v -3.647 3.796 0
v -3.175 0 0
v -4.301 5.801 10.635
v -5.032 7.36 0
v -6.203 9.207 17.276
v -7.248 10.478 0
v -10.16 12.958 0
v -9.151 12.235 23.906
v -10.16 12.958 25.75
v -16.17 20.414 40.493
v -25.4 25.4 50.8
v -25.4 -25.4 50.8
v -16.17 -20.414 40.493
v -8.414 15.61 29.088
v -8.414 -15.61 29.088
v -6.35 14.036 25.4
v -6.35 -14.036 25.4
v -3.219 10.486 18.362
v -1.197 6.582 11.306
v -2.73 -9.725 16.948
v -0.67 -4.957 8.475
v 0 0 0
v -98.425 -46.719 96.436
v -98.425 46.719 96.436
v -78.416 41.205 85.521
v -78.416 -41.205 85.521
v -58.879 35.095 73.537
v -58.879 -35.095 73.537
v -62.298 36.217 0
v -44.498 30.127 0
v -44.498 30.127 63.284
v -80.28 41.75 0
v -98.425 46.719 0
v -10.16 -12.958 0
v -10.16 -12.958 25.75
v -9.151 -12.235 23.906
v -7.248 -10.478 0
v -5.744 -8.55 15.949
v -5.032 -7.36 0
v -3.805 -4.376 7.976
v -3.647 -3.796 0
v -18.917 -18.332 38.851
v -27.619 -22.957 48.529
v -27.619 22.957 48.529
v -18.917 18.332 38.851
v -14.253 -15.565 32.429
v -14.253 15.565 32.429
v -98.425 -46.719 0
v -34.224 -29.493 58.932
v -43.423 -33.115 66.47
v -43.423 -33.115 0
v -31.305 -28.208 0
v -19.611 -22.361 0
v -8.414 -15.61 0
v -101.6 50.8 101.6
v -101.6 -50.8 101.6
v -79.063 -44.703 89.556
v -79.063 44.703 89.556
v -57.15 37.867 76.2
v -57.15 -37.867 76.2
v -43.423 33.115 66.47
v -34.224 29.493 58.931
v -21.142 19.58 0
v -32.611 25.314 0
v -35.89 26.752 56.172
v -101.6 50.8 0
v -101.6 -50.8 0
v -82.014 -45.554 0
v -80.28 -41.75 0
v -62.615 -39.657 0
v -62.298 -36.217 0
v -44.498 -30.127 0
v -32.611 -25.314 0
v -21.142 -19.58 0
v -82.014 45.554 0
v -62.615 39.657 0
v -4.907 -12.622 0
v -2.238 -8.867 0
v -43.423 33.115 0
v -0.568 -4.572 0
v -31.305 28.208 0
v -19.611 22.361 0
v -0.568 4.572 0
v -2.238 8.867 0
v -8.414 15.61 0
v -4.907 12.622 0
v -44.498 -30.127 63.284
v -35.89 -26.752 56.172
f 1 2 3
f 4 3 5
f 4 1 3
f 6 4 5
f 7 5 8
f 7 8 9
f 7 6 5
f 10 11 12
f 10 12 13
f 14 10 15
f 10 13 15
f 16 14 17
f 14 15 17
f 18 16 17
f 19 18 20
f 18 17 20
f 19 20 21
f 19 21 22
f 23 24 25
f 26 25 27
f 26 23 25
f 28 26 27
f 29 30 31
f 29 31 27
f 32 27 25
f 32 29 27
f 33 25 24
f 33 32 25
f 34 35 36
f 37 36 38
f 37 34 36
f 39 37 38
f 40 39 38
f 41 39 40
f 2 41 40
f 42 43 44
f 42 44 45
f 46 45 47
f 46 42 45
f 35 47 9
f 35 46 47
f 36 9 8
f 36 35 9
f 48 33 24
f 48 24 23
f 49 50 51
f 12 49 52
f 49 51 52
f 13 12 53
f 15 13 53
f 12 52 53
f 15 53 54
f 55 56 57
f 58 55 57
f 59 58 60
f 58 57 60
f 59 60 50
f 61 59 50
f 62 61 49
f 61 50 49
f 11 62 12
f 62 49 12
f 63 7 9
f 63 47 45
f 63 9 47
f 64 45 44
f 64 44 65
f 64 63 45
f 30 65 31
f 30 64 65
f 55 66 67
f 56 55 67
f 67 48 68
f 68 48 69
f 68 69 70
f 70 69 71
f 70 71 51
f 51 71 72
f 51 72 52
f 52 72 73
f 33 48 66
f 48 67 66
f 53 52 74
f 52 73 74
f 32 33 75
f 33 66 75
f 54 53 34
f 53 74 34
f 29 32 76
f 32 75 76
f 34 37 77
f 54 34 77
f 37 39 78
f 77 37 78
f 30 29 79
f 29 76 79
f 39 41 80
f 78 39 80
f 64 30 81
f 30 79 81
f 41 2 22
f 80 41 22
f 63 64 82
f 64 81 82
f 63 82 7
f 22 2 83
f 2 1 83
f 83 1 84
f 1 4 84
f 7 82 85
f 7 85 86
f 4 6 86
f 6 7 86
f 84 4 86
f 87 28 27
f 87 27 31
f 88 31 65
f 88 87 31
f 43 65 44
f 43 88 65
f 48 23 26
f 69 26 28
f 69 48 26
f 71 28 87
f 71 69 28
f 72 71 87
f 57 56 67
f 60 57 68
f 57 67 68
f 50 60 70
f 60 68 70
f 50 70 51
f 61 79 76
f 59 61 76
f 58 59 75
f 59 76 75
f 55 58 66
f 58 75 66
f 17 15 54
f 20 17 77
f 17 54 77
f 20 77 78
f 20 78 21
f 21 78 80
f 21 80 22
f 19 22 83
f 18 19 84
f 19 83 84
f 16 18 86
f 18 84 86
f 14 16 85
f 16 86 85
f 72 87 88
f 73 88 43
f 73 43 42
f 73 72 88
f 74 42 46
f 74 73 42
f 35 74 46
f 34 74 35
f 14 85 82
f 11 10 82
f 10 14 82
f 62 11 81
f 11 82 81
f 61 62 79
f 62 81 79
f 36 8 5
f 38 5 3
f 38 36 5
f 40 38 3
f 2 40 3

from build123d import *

# Parameters (mm, degrees)
F1_DEPTH = 203.2
F4_DEPTH = 102.6000000987
F5_T     = -3.175


with BuildPart() as f1:
    # F0 (on Top) → F1 (new body)
    with BuildSketch(Plane.XY):
        with BuildLine():
            ThreePointArc((-43.4231416653, -33.1147542783), (-25.3999999994, -25.3999999994), (-8.4143115766, -15.610339234))
            ThreePointArc((-8.4143115766, -15.610339234), (-2.2375332054, -8.8668389281), (0, 0))
            Line((0, 0), (-101.5999999975, 0))
            Line((-101.5999999975, 0), (-101.5999999975, -50.7999999987))
            ThreePointArc((-101.5999999975, -50.7999999987), (-72.2898591354, -42.6867133396), (-43.4231416653, -33.1147542783))
        make_face()
        with BuildLine():
            Line((-101.5999999975, 0), (0, 0))
            ThreePointArc((0, 0), (-2.2375332054, 8.8668389281), (-8.4143115766, 15.610339234))
            ThreePointArc((-8.4143115766, 15.610339234), (-25.3999999994, 25.3999999994), (-43.4231416653, 33.1147542783))
            ThreePointArc((-43.4231416654, 33.1147542783), (-72.2898591354, 42.6867133396), (-101.5999999975, 50.7999999987))
            Line((-101.5999999975, 50.7999999987), (-101.5999999975, 0))
        make_face()
    extrude(amount=F1_DEPTH)

    # F3 (on offset) → F4 (cut, up to face)
    with BuildSketch(Plane.XZ.offset(50.8)):
        with BuildLine():
            Line((0, 203.2), (-101.5999999975, 203.2))
            Line((-101.5999999975, 203.2), (-101.5999999975, 101.6))
            ThreePointArc((-101.5999999975, 101.6), (-79.0155935729, 89.5289612451), (-57.15, 76.2))
            ThreePointArc((-57.15, 76.2), (-40.6457692508, 64.2865384365), (-25.4, 50.8))
            ThreePointArc((-25.4, 50.8), (-14.8980769231, 38.8326923077), (-6.35, 25.4))
            ThreePointArc((-6.35, 25.4), (-1.6115585547, 13.0908603613), (0, 0))
            Line((0, 0), (0, 203.2))
        make_face()
    extrude(amount=-F4_DEPTH, mode=Mode.SUBTRACT)

    # F5
    f5_openings = [f1.faces().sort_by_distance(p)[0] for p in [
        (-60.726739, 0, 0),
    ]]
    offset(amount=F5_T, openings=f5_openings)


solid = f1.part
